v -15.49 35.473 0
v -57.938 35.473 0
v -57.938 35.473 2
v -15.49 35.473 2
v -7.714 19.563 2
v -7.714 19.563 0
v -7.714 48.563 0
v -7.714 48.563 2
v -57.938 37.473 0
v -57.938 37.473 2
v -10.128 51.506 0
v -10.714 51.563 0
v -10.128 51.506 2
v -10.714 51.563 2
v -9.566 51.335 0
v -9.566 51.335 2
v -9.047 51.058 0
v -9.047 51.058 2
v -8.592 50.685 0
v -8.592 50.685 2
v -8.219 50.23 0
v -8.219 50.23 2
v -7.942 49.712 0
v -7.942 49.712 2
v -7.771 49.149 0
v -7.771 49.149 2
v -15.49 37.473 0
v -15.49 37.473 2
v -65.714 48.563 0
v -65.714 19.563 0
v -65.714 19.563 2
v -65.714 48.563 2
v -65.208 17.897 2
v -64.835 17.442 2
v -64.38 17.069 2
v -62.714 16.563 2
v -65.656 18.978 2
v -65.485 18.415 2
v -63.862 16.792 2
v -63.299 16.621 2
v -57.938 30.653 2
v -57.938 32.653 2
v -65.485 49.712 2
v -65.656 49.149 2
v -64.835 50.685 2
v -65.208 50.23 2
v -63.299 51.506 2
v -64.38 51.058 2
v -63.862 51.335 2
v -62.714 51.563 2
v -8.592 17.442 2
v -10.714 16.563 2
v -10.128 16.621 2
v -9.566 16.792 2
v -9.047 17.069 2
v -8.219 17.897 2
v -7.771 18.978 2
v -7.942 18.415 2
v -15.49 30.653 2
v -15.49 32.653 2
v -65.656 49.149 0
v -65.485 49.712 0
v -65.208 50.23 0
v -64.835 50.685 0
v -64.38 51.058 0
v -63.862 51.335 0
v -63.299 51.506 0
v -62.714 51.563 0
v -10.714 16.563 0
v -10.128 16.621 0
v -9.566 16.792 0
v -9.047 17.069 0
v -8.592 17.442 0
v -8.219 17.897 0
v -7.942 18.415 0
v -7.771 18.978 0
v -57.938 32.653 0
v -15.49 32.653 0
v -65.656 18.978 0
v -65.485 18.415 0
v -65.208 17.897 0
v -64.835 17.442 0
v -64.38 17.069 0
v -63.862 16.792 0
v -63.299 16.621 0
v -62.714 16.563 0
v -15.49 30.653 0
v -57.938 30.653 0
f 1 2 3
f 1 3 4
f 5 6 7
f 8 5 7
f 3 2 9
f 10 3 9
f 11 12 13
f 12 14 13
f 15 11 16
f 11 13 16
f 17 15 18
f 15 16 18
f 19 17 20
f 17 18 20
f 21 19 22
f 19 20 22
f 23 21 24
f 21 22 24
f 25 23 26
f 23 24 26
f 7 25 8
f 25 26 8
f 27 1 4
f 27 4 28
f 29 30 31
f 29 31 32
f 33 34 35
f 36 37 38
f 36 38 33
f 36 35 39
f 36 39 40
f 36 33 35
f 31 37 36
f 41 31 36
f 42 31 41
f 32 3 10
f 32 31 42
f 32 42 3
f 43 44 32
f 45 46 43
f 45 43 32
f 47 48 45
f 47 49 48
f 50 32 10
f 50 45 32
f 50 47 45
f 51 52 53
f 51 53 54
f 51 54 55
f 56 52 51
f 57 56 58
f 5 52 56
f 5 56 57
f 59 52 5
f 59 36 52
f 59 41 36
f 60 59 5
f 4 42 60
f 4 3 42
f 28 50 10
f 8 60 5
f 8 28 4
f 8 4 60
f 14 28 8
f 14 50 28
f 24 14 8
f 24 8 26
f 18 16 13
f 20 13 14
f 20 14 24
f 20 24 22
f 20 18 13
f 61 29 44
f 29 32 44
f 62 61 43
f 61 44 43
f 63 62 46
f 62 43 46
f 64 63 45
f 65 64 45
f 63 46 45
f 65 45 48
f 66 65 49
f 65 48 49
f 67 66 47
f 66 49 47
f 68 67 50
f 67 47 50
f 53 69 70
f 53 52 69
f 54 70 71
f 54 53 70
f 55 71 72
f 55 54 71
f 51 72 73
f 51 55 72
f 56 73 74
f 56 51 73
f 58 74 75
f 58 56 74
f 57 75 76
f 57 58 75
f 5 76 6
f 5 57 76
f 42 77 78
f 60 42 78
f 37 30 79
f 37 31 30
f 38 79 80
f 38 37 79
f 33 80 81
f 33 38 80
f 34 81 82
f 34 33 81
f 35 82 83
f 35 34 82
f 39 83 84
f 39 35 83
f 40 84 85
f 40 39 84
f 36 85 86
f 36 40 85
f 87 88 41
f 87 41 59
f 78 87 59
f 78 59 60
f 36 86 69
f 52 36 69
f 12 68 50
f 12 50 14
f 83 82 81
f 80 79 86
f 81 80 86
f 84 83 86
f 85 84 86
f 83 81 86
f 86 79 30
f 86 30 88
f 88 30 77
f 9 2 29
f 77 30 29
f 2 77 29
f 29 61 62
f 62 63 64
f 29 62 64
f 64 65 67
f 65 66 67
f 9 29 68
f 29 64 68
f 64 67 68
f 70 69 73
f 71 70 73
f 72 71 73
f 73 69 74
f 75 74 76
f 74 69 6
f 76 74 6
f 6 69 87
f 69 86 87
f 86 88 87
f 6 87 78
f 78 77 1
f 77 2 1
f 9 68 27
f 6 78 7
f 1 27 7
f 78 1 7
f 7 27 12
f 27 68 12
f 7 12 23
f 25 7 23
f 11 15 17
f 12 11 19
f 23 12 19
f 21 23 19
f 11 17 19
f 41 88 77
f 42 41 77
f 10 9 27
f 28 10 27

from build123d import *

# Parameters (mm, degrees)
F0_W     = 58
F0_H     = 35
F0_W_2   = 42.448143
F0_H_2   = 2
F1_DEPTH = 2
F2_R     = 3


with BuildPart() as f1:
    # F0 (on Top) → F1 (new body)
    with BuildSketch(Plane.XY):
        with Locations((-36.713654, 34.063472)):
            Rectangle(F0_W, F0_H)
        with Locations((-36.713654, 31.653472)):
            Rectangle(F0_W_2, F0_H_2, mode=Mode.SUBTRACT)
        with Locations((-36.713654, 36.473472)):
            Rectangle(F0_W_2, F0_H_2, mode=Mode.SUBTRACT)
    extrude(amount=F1_DEPTH)

    # F2
    f2_edges = [f1.edges().sort_by_distance(p)[0] for p in [
        (-7.713654, 51.563472, 1),
        (-65.713654, 16.563472, 1),
        (-65.713654, 51.563472, 1),
        (-7.713654, 16.563472, 1),
    ]]
    fillet(f2_edges, radius=F2_R)


solid = f1.part
